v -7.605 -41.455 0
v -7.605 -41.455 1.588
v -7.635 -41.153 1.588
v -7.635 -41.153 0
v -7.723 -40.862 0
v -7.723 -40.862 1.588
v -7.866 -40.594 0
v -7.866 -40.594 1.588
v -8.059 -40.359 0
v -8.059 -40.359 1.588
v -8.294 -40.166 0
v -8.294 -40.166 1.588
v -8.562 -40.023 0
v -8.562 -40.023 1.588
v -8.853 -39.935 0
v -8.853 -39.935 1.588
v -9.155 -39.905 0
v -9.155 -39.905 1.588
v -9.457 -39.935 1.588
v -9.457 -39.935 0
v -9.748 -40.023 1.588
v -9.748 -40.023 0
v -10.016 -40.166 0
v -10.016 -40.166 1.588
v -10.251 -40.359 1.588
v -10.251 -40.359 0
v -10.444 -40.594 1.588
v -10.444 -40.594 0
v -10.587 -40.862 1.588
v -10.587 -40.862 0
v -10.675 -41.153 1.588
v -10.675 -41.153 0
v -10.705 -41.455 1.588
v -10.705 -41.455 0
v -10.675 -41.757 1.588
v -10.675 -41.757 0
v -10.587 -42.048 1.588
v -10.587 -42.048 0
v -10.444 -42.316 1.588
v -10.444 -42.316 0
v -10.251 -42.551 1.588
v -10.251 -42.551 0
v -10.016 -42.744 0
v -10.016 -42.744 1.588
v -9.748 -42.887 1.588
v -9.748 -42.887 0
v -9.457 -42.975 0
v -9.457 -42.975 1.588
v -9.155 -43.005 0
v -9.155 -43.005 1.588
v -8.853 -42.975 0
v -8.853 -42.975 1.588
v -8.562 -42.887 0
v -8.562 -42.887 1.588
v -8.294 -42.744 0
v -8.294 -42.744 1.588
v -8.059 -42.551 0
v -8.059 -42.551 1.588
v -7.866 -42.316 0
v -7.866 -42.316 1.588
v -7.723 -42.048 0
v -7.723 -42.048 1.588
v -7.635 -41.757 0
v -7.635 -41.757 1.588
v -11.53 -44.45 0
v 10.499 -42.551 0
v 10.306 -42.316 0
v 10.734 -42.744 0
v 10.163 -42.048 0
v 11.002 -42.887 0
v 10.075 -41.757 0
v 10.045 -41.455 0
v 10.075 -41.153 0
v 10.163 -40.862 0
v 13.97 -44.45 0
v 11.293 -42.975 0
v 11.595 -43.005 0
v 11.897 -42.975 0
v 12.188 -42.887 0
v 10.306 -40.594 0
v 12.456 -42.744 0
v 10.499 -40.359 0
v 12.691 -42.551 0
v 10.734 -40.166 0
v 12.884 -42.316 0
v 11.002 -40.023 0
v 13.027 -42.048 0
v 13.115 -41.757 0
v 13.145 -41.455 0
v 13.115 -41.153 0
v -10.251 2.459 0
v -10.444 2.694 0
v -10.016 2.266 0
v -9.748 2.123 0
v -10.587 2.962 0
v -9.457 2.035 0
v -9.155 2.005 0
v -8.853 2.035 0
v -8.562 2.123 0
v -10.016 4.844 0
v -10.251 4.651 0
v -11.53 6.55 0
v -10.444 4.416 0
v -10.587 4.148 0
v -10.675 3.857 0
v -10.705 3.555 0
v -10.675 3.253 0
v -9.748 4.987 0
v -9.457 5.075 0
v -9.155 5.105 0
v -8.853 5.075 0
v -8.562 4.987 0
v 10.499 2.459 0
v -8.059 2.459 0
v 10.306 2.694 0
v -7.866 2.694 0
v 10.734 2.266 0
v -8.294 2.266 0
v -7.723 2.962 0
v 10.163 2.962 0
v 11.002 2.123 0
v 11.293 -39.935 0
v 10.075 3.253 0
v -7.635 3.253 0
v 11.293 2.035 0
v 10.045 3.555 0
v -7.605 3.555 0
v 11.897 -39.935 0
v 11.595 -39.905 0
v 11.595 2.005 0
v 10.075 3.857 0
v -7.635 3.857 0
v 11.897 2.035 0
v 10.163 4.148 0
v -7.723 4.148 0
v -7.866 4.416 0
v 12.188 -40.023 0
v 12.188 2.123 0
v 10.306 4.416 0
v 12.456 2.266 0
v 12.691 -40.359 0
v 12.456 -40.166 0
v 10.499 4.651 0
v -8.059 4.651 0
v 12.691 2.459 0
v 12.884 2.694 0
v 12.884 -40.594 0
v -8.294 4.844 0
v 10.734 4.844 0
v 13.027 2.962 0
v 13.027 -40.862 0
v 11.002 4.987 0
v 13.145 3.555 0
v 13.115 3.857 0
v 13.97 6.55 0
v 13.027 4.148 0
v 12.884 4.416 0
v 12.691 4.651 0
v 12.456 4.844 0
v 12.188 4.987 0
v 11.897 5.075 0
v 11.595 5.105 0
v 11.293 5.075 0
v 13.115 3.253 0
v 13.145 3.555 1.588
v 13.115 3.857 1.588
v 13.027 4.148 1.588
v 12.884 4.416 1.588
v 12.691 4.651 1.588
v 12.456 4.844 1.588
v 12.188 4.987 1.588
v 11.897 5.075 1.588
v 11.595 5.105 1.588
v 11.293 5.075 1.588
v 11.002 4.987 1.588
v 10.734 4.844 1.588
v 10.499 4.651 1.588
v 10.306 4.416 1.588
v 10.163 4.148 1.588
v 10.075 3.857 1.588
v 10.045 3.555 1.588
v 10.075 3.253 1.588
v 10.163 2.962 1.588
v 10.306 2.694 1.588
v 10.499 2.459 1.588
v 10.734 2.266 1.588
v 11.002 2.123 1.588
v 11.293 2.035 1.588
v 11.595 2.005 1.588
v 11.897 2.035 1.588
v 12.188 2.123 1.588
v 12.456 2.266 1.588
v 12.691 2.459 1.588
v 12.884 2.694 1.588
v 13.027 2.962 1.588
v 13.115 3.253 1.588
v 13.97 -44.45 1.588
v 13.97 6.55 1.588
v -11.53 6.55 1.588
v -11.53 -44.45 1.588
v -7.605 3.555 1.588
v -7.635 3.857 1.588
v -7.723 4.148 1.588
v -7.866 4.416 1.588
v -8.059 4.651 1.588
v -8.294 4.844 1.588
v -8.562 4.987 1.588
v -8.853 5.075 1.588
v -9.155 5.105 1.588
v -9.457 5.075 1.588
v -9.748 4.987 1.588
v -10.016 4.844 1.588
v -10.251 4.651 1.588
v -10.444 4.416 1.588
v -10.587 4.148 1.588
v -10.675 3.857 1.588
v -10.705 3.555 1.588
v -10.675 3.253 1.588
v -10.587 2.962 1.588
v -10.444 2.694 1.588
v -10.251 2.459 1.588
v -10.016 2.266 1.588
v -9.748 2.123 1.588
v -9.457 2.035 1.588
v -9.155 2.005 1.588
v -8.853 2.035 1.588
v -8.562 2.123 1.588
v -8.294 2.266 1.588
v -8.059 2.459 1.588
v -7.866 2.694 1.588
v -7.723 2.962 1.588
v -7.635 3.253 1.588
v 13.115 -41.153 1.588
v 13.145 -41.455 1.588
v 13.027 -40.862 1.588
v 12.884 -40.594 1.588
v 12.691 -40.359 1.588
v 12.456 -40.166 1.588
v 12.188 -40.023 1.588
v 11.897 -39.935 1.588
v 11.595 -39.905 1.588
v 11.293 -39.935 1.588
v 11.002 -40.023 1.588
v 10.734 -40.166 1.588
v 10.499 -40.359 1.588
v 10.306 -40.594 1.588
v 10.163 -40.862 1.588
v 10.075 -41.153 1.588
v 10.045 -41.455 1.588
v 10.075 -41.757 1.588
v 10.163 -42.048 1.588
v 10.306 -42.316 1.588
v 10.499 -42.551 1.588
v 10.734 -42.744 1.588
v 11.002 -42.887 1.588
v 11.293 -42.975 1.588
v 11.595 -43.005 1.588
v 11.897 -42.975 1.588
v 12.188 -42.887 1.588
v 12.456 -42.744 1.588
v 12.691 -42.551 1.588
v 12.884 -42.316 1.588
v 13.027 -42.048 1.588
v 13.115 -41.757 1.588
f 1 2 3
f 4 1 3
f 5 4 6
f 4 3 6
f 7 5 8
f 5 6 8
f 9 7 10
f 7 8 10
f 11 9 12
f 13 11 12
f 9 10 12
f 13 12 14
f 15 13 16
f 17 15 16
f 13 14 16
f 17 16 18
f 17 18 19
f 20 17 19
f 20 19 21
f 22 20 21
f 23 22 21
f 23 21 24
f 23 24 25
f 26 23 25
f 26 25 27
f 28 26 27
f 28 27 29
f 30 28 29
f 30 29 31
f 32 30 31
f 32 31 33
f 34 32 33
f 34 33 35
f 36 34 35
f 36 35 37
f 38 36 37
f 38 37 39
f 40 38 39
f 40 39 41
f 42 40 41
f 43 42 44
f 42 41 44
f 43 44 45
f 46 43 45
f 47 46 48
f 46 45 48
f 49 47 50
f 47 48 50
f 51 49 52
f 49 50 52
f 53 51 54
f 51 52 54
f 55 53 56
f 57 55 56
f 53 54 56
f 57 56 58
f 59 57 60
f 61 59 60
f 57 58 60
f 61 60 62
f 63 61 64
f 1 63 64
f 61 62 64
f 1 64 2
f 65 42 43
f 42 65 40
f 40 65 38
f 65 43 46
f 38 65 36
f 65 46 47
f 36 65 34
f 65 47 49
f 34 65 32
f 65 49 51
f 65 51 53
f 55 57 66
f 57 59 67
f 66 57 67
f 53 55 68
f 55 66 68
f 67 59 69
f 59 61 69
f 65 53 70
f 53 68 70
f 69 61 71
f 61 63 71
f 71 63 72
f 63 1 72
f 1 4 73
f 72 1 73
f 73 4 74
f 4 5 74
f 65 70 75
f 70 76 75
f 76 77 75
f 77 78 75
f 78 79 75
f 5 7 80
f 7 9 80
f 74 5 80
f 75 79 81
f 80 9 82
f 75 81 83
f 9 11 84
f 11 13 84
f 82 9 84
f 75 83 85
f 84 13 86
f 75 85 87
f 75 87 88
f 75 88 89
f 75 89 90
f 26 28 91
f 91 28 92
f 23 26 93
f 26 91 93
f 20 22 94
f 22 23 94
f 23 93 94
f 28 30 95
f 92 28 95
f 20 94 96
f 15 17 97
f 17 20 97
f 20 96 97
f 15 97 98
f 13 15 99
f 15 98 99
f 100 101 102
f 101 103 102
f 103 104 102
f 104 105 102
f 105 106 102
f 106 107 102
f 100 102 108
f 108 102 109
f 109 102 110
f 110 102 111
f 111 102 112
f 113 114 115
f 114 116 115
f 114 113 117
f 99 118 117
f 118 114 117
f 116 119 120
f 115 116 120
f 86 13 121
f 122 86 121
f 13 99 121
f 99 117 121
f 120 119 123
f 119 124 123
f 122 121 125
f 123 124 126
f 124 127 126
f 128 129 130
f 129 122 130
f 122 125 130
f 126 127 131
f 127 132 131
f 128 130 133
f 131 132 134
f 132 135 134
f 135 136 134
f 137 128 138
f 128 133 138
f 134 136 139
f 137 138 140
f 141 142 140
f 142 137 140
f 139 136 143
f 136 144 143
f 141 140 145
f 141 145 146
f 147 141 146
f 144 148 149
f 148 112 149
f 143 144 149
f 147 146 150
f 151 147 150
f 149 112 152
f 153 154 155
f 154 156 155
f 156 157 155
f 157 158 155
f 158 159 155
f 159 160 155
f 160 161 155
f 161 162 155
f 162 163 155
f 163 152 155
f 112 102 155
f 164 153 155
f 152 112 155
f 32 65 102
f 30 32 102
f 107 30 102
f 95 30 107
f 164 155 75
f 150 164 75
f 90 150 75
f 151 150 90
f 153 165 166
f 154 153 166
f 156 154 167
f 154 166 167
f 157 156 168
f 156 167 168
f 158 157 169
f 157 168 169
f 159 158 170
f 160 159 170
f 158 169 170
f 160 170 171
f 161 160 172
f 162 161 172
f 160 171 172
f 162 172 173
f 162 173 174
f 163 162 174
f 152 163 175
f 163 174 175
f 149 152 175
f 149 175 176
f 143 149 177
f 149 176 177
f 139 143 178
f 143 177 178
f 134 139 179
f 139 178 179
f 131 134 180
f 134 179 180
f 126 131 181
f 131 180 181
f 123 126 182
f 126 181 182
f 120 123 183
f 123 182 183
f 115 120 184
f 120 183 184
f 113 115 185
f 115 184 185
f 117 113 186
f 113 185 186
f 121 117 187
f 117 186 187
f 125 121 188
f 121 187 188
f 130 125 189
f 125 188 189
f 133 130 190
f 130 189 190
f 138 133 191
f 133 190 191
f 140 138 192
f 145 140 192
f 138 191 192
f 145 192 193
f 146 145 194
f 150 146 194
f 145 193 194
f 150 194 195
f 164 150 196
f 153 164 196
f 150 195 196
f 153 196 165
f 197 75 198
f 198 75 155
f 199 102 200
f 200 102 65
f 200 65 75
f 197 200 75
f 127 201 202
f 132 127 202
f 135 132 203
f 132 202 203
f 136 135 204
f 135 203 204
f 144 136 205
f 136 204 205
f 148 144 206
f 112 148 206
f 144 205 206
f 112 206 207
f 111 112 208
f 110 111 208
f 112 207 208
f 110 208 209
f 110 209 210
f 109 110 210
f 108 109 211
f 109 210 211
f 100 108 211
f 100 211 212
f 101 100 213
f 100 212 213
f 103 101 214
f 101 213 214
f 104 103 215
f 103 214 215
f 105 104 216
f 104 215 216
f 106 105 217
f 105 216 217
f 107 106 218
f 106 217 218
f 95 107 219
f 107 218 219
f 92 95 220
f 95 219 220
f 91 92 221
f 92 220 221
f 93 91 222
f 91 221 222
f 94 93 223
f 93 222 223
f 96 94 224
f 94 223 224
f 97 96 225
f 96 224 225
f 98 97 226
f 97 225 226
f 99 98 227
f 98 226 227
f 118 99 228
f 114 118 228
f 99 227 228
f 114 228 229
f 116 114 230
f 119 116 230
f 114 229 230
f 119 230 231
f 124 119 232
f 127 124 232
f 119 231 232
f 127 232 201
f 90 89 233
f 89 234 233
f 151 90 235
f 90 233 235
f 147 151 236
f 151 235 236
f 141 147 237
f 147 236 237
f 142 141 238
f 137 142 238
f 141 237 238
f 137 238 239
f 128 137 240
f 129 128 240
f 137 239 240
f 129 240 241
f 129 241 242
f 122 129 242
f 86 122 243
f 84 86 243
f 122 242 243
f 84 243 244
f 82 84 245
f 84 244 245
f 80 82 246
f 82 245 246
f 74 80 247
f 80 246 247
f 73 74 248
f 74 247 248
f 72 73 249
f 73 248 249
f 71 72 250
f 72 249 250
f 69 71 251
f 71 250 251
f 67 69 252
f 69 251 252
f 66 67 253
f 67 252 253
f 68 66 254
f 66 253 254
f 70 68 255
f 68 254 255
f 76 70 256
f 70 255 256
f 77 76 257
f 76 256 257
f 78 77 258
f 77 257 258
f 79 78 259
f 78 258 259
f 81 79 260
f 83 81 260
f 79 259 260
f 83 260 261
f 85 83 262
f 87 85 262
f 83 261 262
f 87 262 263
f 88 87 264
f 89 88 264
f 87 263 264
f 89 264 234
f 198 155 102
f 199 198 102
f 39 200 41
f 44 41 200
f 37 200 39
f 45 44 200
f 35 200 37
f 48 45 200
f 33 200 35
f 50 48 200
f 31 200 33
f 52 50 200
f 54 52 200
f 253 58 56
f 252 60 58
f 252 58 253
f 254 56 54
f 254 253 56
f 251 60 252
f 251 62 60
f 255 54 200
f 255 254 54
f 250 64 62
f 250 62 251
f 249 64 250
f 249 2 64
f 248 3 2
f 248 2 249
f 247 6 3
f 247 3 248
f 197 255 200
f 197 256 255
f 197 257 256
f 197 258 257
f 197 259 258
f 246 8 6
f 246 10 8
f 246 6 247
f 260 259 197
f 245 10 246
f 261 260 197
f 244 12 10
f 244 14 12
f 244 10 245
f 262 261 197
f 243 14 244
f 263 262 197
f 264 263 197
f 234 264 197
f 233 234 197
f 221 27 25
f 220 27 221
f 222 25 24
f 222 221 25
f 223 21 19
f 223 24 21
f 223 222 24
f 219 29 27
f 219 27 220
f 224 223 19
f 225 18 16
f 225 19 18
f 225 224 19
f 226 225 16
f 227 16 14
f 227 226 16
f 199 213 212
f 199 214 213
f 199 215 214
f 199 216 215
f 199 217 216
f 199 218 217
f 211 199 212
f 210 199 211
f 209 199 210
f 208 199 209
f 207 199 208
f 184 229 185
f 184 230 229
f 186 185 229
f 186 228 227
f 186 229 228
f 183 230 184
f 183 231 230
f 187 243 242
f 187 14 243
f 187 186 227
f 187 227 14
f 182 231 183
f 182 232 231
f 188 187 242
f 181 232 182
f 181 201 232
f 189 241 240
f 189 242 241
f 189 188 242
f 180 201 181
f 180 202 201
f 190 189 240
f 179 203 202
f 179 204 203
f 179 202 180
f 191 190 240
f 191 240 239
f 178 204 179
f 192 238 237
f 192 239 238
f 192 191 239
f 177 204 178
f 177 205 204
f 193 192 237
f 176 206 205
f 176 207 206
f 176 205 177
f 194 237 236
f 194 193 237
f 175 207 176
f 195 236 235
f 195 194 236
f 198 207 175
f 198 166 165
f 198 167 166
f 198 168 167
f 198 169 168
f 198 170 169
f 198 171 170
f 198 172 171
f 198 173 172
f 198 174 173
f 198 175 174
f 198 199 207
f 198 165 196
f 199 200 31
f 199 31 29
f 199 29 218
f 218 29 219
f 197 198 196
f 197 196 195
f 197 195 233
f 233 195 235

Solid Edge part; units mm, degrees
sketch "Sketch1" plane through (0, 0, 0) normal (0, 0, 1) x (1, 0, 0)
  line L0 (-11.53, 6.55) -> (-11.53, -44.45)
  line L1 (-11.53, -44.45) -> (13.97, -44.45)
  line L2 (13.97, -44.45) -> (13.97, 6.55)
  line L3 (13.97, 6.55) -> (-11.53, 6.55)
extrude "Protrusion1" add sketch "Sketch1" along normal blind 1.5875
sketch "Sketch2" plane through (1.22, -18.95, 1.5875) normal (0, 0, 1) x (1, 0, 0)
  circle A0 centre (-10.375, 22.505) radius 1.55
  circle A1 centre (10.375, 22.505) radius 1.55
  circle A2 centre (10.375, -22.505) radius 1.55
  circle A3 centre (-10.375, -22.505) radius 1.55
  dimension "D1" = 3.1
  dimension "D2" = 17.65
  dimension "D3" = 41.91
extrude "ExtrudedCutout_1" cut sketch "Sketch2" against normal blind 58.166
